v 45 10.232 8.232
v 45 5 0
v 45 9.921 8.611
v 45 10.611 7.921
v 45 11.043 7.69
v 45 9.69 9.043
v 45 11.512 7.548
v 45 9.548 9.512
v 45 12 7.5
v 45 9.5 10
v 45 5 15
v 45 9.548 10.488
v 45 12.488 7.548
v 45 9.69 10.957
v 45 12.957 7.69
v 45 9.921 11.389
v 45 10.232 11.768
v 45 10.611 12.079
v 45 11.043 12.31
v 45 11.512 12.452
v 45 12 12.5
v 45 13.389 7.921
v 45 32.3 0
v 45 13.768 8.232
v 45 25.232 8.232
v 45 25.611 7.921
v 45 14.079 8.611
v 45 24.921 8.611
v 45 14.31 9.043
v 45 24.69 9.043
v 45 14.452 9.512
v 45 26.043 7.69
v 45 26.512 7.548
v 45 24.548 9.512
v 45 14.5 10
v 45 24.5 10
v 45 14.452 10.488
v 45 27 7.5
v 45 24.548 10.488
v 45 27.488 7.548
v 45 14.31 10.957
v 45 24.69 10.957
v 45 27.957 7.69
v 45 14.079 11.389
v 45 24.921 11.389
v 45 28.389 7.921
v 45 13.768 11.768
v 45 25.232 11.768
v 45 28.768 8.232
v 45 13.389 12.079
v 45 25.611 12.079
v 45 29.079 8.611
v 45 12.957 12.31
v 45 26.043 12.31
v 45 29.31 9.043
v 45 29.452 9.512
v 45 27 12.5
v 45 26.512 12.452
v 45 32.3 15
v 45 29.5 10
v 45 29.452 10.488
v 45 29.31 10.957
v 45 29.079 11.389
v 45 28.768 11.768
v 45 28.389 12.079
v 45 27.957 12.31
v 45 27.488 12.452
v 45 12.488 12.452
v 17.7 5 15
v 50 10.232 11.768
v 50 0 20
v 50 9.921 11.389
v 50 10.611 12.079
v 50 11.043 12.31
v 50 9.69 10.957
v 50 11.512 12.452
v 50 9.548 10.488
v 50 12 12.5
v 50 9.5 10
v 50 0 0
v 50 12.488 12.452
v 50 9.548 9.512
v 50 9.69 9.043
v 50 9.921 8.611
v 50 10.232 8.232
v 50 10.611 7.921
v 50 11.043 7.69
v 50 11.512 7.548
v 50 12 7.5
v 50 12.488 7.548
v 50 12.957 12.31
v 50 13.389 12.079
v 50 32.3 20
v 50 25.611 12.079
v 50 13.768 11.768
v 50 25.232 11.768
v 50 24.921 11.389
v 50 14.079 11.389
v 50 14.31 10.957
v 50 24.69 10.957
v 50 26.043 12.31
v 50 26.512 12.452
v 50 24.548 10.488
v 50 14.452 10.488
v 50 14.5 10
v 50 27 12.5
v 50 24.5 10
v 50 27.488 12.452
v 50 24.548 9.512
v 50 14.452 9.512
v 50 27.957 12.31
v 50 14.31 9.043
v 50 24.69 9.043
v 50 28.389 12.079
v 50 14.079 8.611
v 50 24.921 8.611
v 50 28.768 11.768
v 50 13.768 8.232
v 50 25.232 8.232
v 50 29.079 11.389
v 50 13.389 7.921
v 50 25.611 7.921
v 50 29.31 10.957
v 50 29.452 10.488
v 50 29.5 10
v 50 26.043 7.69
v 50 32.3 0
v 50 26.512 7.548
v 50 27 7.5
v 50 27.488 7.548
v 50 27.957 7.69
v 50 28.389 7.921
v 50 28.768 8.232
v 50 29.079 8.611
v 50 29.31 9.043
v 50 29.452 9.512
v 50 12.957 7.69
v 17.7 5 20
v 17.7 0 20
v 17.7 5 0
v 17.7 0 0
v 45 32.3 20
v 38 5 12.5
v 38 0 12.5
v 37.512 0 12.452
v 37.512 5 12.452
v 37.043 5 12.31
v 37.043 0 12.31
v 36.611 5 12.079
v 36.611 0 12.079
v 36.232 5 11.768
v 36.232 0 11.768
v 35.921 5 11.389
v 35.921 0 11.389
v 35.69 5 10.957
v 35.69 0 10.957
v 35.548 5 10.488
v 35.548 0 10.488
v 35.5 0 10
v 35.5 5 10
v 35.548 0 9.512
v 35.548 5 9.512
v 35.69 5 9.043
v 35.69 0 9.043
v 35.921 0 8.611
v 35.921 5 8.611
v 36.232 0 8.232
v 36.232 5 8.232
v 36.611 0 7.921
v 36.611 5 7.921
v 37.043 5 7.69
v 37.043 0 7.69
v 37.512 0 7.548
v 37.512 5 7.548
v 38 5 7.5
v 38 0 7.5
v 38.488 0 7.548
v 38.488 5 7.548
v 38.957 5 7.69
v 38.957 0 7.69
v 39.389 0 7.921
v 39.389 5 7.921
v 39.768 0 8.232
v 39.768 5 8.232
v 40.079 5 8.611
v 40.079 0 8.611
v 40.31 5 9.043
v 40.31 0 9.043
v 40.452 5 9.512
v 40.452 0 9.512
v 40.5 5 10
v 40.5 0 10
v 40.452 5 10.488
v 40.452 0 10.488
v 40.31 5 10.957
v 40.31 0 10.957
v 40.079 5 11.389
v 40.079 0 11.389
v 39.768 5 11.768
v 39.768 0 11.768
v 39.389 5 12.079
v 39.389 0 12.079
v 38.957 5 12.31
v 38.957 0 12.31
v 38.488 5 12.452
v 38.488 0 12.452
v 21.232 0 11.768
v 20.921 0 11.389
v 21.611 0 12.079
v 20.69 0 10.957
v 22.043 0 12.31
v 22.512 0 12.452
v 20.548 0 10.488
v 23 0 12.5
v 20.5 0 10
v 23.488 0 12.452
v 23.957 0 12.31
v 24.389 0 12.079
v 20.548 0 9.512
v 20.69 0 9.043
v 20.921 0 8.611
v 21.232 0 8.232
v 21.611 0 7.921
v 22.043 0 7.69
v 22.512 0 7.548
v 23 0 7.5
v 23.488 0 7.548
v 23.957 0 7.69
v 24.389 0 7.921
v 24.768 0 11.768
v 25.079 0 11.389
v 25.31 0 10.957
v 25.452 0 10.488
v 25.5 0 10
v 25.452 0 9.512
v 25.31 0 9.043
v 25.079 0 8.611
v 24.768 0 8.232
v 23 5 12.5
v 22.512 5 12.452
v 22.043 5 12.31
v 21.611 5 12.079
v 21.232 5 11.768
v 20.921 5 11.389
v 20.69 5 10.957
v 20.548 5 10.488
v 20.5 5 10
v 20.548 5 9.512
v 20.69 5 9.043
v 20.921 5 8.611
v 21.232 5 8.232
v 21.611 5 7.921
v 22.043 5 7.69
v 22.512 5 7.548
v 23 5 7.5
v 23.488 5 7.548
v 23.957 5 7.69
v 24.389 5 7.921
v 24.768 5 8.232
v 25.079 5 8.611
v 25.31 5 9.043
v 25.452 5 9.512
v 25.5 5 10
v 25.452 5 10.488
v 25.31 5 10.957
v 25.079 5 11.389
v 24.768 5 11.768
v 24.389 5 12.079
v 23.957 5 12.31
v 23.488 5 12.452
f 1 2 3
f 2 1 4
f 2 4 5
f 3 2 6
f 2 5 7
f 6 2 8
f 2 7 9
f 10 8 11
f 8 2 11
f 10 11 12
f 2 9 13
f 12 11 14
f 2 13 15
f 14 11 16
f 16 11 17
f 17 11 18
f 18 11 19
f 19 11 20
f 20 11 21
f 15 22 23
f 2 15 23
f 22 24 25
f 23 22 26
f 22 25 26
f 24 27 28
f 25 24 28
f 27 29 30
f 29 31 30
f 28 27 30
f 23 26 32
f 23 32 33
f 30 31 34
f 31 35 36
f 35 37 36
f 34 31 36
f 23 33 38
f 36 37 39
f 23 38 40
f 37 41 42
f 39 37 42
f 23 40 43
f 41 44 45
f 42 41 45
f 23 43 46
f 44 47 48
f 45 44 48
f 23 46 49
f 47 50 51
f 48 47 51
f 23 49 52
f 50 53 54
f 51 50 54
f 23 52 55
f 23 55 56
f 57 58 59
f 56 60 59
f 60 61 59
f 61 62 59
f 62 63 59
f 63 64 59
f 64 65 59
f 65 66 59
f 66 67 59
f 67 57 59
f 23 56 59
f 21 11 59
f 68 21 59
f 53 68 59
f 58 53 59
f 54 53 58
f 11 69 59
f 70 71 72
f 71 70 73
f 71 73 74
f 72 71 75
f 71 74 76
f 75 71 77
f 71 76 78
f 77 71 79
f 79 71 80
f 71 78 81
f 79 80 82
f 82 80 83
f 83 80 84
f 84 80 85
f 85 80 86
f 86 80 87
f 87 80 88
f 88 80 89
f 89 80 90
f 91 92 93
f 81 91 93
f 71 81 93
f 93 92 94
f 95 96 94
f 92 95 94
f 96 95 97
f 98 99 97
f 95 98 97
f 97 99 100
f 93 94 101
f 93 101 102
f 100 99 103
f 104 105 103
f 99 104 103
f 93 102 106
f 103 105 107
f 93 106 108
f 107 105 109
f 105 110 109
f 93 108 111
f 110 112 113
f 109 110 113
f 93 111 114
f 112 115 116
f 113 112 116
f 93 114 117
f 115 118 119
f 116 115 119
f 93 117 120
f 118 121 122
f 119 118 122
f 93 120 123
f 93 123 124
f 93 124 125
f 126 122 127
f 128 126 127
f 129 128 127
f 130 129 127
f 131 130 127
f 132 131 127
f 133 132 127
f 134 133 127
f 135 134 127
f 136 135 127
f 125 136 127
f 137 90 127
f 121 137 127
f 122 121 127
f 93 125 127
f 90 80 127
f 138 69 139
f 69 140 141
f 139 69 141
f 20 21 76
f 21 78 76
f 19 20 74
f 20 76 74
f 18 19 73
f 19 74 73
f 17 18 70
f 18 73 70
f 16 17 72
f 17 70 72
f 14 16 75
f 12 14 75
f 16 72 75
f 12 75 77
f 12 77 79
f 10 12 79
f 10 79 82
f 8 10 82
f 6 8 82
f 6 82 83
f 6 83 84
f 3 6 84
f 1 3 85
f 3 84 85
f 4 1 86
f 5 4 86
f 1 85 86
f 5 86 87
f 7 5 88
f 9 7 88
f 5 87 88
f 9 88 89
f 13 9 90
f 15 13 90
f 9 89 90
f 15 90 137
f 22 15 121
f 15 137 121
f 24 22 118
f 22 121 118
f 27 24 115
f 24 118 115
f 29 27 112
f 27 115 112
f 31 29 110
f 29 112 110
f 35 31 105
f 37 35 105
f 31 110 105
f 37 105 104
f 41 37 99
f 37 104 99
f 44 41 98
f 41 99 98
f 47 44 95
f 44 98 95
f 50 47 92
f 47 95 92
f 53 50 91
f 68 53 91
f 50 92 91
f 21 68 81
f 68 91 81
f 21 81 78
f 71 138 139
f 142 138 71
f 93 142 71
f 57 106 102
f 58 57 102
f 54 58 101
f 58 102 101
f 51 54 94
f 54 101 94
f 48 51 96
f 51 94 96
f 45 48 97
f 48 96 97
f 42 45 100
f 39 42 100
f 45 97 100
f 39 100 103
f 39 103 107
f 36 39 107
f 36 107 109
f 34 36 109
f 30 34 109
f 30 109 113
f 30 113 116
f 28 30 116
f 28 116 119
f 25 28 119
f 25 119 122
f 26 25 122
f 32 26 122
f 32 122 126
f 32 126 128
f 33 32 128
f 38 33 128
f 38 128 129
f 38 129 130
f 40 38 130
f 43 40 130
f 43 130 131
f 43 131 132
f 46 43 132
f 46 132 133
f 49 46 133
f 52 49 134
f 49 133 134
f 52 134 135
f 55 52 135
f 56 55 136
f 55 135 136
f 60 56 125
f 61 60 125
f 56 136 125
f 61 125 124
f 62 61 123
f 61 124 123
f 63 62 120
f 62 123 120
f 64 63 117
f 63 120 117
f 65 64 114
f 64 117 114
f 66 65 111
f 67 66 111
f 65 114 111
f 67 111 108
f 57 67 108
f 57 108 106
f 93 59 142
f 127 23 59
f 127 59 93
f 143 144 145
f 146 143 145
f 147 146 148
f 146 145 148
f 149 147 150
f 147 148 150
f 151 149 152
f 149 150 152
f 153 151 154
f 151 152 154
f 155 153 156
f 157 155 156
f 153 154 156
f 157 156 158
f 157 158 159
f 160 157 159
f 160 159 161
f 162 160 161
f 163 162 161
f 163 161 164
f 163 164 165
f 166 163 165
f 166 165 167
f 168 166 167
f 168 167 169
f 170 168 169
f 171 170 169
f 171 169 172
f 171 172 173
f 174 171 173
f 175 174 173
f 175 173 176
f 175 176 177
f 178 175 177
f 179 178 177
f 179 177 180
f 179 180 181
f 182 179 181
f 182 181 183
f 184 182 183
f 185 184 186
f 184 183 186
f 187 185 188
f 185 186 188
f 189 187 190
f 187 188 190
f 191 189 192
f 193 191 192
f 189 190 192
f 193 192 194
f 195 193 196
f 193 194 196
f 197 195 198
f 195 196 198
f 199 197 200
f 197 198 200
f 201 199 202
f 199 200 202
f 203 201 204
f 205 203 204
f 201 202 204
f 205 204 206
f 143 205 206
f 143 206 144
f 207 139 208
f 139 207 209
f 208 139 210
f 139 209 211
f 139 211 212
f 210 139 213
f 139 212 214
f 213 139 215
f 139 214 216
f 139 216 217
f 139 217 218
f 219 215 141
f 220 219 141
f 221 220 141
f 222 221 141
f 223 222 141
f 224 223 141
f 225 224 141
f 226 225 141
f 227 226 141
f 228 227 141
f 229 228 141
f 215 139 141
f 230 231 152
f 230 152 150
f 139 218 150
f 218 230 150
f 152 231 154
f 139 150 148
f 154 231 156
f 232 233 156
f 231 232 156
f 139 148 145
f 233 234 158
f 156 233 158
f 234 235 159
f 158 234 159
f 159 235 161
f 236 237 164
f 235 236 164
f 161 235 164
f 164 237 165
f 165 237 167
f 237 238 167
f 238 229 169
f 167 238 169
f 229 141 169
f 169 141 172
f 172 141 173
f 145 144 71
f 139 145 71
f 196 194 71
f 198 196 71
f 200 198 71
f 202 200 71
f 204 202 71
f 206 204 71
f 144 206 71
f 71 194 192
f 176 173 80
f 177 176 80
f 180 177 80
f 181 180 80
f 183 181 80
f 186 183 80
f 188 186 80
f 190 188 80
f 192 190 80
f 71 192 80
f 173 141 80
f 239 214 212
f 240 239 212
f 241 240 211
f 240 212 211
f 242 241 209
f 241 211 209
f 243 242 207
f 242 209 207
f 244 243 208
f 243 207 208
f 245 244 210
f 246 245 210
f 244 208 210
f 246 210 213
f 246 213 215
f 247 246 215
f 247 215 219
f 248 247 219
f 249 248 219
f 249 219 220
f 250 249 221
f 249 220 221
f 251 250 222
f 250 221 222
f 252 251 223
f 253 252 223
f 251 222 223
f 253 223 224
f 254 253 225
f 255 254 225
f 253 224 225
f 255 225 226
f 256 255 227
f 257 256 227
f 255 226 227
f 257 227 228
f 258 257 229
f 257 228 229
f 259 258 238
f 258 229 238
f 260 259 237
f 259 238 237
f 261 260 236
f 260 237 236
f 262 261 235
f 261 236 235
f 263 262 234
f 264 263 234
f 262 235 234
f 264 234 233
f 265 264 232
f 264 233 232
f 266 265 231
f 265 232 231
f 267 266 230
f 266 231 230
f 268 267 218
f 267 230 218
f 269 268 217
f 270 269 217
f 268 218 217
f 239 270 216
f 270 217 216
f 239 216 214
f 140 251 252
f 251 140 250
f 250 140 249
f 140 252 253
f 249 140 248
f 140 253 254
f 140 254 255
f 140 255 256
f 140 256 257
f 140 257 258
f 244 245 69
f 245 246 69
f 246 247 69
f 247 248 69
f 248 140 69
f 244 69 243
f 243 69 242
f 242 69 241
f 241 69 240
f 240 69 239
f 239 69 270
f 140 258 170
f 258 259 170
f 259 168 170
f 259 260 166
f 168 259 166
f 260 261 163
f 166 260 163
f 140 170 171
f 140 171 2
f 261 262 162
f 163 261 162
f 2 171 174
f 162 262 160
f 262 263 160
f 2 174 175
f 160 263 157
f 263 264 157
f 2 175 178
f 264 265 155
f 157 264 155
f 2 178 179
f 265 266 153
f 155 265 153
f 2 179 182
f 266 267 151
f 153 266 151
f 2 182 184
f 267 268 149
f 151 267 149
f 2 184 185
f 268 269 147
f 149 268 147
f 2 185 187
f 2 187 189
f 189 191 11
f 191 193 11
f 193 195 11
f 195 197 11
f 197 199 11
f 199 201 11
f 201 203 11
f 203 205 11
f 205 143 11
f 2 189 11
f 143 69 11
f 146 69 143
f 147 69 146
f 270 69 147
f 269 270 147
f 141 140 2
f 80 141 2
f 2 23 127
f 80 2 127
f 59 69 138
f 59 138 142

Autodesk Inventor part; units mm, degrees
ref_plane "YZ Plane" through (0, 0, 0) normal (1, 0, 0) x (0, 1, 0)
ref_plane "XZ Plane" through (0, 0, 0) normal (0, 1, 0) x (-1, 0, 0)
ref_plane "XY Plane" through (0, 0, 0) normal (0, 0, 1) x (1, 0, 0)
sketch "Sketch1" plane through (0, 0, 0) normal (0, 0, 1) x (1, 0, 0)
  line L0 (0, 0) -> (50, 0)
  line L1 (50, 0) -> (50, 50)
  line L2 (50, 50) -> (0, 0)
  dimension "d0" = 50
  dimension "d1" = 50
extrude "Extrusion1" add sketch "Sketch1" along normal blind 20
sketch "Sketch2" plane through (0, 0, 20) normal (0, 0, 1) x (1, 0, 0)
  line L0 (50, 50) -> (0, 0) projected
  line L1 (5, 5) -> (45, 5)
  line L2 (45, 5) -> (45, 45)
  line L3 (50, 0) -> (50, 50) projected
  line L4 (0, 0) -> (50, 0) projected
  dimension "d4" = 5
  dimension "d5" = 5
extrude "Extrusion2" cut sketch "Sketch2" against normal through all contours L2 L1 L0
extrude "Extrusion3" add sketch "Sketch2" against normal blind 5 contours L2 L1 L0
sketch "Sketch3" plane through (0, 0, 0) normal (0, 0, -1) x (-1, 0, 0)
  line L0 (-12.7, 0) -> (-50, 37.3)
  line L1 (-50, 0) -> (-50, 50) projected
  line L2 (-60.6675, 53.6604) -> (-50, 37.3)
  line L3 (-60.6675, 53.6604) -> (-37.4752, 61.571)
  line L4 (-37.4752, 61.571) -> (23.8314, -5.4888)
  line L5 (23.8314, -5.4888) -> (-5.9204, -12.6802)
  line L6 (-5.9204, -12.6802) -> (-12.7, 0)
  point P0 (0, 0)
  dimension "d12" = 12.7
  dimension "d13" = 12.7
extrude "Extrusion5" cut sketch "Sketch3" against normal through all
sketch "Sketch5" plane through (45, 5, 0) normal (-1, 0, 0) x (0, 0, 1)
  line L0 (0, 0) -> (0, 27.3) projected
  line L1 (20, -5) -> (0, -5) projected
  point P0 (10, 22)
  point P1 (10, 7)
  dimension "d28" = 10
  dimension "d29" = 10
  dimension "d30" = 15
  dimension "d31" = 12
hole "Hole2" at (45, 27, 10) at (45, 12, 10) direction (1, 0, 0) diameter 5 depth 25.4 tip angle 118
sketch "Sketch6" plane through (45, 5, 15) normal (0, 1, 0) x (1, 0, 0)
  line L0 (-27.3, 15) -> (0, 15) projected
  line L1 (5, 15) -> (5, -5) projected
  point P0 (-45, 15)
  point P1 (-7, 5)
  point P2 (-22, 5)
  dimension "d39" = 15
  dimension "d40" = 10
  dimension "d41" = 10
  dimension "d42" = 12
hole "Hole3" at (38, 5, 10) at (23, 5, 10) direction (0, -1, 0) diameter 5 depth 25.4 tip angle 118
sketch "Sketch7" plane through (0, 0, 0) normal (0, 0, -1) x (-1, 0, 0)
  line L0 (-17.7, 5) -> (-17.7, 0)
  line L1 (-12.7, 0) -> (-50, 0) projected
  line L2 (-17.7, 0) -> (-12.7, 0)
  line L3 (-12.7, 0) -> (-17.7, 5)
  line L4 (-12.7, 0) -> (-17.7, 5) projected
  line L5 (-45, 32.3) -> (-50, 32.3)
  line L6 (-50, 0) -> (-50, 37.3) projected
  line L7 (-50, 32.3) -> (-50, 37.3)
  line L8 (-50, 37.3) -> (-45, 32.3)
  line L9 (-45, 32.3) -> (-50, 37.3) projected
  point P0 (0, 0)
extrude "Extrusion6" cut sketch "Sketch7" against normal blind 25.4
properties part number "corners"
